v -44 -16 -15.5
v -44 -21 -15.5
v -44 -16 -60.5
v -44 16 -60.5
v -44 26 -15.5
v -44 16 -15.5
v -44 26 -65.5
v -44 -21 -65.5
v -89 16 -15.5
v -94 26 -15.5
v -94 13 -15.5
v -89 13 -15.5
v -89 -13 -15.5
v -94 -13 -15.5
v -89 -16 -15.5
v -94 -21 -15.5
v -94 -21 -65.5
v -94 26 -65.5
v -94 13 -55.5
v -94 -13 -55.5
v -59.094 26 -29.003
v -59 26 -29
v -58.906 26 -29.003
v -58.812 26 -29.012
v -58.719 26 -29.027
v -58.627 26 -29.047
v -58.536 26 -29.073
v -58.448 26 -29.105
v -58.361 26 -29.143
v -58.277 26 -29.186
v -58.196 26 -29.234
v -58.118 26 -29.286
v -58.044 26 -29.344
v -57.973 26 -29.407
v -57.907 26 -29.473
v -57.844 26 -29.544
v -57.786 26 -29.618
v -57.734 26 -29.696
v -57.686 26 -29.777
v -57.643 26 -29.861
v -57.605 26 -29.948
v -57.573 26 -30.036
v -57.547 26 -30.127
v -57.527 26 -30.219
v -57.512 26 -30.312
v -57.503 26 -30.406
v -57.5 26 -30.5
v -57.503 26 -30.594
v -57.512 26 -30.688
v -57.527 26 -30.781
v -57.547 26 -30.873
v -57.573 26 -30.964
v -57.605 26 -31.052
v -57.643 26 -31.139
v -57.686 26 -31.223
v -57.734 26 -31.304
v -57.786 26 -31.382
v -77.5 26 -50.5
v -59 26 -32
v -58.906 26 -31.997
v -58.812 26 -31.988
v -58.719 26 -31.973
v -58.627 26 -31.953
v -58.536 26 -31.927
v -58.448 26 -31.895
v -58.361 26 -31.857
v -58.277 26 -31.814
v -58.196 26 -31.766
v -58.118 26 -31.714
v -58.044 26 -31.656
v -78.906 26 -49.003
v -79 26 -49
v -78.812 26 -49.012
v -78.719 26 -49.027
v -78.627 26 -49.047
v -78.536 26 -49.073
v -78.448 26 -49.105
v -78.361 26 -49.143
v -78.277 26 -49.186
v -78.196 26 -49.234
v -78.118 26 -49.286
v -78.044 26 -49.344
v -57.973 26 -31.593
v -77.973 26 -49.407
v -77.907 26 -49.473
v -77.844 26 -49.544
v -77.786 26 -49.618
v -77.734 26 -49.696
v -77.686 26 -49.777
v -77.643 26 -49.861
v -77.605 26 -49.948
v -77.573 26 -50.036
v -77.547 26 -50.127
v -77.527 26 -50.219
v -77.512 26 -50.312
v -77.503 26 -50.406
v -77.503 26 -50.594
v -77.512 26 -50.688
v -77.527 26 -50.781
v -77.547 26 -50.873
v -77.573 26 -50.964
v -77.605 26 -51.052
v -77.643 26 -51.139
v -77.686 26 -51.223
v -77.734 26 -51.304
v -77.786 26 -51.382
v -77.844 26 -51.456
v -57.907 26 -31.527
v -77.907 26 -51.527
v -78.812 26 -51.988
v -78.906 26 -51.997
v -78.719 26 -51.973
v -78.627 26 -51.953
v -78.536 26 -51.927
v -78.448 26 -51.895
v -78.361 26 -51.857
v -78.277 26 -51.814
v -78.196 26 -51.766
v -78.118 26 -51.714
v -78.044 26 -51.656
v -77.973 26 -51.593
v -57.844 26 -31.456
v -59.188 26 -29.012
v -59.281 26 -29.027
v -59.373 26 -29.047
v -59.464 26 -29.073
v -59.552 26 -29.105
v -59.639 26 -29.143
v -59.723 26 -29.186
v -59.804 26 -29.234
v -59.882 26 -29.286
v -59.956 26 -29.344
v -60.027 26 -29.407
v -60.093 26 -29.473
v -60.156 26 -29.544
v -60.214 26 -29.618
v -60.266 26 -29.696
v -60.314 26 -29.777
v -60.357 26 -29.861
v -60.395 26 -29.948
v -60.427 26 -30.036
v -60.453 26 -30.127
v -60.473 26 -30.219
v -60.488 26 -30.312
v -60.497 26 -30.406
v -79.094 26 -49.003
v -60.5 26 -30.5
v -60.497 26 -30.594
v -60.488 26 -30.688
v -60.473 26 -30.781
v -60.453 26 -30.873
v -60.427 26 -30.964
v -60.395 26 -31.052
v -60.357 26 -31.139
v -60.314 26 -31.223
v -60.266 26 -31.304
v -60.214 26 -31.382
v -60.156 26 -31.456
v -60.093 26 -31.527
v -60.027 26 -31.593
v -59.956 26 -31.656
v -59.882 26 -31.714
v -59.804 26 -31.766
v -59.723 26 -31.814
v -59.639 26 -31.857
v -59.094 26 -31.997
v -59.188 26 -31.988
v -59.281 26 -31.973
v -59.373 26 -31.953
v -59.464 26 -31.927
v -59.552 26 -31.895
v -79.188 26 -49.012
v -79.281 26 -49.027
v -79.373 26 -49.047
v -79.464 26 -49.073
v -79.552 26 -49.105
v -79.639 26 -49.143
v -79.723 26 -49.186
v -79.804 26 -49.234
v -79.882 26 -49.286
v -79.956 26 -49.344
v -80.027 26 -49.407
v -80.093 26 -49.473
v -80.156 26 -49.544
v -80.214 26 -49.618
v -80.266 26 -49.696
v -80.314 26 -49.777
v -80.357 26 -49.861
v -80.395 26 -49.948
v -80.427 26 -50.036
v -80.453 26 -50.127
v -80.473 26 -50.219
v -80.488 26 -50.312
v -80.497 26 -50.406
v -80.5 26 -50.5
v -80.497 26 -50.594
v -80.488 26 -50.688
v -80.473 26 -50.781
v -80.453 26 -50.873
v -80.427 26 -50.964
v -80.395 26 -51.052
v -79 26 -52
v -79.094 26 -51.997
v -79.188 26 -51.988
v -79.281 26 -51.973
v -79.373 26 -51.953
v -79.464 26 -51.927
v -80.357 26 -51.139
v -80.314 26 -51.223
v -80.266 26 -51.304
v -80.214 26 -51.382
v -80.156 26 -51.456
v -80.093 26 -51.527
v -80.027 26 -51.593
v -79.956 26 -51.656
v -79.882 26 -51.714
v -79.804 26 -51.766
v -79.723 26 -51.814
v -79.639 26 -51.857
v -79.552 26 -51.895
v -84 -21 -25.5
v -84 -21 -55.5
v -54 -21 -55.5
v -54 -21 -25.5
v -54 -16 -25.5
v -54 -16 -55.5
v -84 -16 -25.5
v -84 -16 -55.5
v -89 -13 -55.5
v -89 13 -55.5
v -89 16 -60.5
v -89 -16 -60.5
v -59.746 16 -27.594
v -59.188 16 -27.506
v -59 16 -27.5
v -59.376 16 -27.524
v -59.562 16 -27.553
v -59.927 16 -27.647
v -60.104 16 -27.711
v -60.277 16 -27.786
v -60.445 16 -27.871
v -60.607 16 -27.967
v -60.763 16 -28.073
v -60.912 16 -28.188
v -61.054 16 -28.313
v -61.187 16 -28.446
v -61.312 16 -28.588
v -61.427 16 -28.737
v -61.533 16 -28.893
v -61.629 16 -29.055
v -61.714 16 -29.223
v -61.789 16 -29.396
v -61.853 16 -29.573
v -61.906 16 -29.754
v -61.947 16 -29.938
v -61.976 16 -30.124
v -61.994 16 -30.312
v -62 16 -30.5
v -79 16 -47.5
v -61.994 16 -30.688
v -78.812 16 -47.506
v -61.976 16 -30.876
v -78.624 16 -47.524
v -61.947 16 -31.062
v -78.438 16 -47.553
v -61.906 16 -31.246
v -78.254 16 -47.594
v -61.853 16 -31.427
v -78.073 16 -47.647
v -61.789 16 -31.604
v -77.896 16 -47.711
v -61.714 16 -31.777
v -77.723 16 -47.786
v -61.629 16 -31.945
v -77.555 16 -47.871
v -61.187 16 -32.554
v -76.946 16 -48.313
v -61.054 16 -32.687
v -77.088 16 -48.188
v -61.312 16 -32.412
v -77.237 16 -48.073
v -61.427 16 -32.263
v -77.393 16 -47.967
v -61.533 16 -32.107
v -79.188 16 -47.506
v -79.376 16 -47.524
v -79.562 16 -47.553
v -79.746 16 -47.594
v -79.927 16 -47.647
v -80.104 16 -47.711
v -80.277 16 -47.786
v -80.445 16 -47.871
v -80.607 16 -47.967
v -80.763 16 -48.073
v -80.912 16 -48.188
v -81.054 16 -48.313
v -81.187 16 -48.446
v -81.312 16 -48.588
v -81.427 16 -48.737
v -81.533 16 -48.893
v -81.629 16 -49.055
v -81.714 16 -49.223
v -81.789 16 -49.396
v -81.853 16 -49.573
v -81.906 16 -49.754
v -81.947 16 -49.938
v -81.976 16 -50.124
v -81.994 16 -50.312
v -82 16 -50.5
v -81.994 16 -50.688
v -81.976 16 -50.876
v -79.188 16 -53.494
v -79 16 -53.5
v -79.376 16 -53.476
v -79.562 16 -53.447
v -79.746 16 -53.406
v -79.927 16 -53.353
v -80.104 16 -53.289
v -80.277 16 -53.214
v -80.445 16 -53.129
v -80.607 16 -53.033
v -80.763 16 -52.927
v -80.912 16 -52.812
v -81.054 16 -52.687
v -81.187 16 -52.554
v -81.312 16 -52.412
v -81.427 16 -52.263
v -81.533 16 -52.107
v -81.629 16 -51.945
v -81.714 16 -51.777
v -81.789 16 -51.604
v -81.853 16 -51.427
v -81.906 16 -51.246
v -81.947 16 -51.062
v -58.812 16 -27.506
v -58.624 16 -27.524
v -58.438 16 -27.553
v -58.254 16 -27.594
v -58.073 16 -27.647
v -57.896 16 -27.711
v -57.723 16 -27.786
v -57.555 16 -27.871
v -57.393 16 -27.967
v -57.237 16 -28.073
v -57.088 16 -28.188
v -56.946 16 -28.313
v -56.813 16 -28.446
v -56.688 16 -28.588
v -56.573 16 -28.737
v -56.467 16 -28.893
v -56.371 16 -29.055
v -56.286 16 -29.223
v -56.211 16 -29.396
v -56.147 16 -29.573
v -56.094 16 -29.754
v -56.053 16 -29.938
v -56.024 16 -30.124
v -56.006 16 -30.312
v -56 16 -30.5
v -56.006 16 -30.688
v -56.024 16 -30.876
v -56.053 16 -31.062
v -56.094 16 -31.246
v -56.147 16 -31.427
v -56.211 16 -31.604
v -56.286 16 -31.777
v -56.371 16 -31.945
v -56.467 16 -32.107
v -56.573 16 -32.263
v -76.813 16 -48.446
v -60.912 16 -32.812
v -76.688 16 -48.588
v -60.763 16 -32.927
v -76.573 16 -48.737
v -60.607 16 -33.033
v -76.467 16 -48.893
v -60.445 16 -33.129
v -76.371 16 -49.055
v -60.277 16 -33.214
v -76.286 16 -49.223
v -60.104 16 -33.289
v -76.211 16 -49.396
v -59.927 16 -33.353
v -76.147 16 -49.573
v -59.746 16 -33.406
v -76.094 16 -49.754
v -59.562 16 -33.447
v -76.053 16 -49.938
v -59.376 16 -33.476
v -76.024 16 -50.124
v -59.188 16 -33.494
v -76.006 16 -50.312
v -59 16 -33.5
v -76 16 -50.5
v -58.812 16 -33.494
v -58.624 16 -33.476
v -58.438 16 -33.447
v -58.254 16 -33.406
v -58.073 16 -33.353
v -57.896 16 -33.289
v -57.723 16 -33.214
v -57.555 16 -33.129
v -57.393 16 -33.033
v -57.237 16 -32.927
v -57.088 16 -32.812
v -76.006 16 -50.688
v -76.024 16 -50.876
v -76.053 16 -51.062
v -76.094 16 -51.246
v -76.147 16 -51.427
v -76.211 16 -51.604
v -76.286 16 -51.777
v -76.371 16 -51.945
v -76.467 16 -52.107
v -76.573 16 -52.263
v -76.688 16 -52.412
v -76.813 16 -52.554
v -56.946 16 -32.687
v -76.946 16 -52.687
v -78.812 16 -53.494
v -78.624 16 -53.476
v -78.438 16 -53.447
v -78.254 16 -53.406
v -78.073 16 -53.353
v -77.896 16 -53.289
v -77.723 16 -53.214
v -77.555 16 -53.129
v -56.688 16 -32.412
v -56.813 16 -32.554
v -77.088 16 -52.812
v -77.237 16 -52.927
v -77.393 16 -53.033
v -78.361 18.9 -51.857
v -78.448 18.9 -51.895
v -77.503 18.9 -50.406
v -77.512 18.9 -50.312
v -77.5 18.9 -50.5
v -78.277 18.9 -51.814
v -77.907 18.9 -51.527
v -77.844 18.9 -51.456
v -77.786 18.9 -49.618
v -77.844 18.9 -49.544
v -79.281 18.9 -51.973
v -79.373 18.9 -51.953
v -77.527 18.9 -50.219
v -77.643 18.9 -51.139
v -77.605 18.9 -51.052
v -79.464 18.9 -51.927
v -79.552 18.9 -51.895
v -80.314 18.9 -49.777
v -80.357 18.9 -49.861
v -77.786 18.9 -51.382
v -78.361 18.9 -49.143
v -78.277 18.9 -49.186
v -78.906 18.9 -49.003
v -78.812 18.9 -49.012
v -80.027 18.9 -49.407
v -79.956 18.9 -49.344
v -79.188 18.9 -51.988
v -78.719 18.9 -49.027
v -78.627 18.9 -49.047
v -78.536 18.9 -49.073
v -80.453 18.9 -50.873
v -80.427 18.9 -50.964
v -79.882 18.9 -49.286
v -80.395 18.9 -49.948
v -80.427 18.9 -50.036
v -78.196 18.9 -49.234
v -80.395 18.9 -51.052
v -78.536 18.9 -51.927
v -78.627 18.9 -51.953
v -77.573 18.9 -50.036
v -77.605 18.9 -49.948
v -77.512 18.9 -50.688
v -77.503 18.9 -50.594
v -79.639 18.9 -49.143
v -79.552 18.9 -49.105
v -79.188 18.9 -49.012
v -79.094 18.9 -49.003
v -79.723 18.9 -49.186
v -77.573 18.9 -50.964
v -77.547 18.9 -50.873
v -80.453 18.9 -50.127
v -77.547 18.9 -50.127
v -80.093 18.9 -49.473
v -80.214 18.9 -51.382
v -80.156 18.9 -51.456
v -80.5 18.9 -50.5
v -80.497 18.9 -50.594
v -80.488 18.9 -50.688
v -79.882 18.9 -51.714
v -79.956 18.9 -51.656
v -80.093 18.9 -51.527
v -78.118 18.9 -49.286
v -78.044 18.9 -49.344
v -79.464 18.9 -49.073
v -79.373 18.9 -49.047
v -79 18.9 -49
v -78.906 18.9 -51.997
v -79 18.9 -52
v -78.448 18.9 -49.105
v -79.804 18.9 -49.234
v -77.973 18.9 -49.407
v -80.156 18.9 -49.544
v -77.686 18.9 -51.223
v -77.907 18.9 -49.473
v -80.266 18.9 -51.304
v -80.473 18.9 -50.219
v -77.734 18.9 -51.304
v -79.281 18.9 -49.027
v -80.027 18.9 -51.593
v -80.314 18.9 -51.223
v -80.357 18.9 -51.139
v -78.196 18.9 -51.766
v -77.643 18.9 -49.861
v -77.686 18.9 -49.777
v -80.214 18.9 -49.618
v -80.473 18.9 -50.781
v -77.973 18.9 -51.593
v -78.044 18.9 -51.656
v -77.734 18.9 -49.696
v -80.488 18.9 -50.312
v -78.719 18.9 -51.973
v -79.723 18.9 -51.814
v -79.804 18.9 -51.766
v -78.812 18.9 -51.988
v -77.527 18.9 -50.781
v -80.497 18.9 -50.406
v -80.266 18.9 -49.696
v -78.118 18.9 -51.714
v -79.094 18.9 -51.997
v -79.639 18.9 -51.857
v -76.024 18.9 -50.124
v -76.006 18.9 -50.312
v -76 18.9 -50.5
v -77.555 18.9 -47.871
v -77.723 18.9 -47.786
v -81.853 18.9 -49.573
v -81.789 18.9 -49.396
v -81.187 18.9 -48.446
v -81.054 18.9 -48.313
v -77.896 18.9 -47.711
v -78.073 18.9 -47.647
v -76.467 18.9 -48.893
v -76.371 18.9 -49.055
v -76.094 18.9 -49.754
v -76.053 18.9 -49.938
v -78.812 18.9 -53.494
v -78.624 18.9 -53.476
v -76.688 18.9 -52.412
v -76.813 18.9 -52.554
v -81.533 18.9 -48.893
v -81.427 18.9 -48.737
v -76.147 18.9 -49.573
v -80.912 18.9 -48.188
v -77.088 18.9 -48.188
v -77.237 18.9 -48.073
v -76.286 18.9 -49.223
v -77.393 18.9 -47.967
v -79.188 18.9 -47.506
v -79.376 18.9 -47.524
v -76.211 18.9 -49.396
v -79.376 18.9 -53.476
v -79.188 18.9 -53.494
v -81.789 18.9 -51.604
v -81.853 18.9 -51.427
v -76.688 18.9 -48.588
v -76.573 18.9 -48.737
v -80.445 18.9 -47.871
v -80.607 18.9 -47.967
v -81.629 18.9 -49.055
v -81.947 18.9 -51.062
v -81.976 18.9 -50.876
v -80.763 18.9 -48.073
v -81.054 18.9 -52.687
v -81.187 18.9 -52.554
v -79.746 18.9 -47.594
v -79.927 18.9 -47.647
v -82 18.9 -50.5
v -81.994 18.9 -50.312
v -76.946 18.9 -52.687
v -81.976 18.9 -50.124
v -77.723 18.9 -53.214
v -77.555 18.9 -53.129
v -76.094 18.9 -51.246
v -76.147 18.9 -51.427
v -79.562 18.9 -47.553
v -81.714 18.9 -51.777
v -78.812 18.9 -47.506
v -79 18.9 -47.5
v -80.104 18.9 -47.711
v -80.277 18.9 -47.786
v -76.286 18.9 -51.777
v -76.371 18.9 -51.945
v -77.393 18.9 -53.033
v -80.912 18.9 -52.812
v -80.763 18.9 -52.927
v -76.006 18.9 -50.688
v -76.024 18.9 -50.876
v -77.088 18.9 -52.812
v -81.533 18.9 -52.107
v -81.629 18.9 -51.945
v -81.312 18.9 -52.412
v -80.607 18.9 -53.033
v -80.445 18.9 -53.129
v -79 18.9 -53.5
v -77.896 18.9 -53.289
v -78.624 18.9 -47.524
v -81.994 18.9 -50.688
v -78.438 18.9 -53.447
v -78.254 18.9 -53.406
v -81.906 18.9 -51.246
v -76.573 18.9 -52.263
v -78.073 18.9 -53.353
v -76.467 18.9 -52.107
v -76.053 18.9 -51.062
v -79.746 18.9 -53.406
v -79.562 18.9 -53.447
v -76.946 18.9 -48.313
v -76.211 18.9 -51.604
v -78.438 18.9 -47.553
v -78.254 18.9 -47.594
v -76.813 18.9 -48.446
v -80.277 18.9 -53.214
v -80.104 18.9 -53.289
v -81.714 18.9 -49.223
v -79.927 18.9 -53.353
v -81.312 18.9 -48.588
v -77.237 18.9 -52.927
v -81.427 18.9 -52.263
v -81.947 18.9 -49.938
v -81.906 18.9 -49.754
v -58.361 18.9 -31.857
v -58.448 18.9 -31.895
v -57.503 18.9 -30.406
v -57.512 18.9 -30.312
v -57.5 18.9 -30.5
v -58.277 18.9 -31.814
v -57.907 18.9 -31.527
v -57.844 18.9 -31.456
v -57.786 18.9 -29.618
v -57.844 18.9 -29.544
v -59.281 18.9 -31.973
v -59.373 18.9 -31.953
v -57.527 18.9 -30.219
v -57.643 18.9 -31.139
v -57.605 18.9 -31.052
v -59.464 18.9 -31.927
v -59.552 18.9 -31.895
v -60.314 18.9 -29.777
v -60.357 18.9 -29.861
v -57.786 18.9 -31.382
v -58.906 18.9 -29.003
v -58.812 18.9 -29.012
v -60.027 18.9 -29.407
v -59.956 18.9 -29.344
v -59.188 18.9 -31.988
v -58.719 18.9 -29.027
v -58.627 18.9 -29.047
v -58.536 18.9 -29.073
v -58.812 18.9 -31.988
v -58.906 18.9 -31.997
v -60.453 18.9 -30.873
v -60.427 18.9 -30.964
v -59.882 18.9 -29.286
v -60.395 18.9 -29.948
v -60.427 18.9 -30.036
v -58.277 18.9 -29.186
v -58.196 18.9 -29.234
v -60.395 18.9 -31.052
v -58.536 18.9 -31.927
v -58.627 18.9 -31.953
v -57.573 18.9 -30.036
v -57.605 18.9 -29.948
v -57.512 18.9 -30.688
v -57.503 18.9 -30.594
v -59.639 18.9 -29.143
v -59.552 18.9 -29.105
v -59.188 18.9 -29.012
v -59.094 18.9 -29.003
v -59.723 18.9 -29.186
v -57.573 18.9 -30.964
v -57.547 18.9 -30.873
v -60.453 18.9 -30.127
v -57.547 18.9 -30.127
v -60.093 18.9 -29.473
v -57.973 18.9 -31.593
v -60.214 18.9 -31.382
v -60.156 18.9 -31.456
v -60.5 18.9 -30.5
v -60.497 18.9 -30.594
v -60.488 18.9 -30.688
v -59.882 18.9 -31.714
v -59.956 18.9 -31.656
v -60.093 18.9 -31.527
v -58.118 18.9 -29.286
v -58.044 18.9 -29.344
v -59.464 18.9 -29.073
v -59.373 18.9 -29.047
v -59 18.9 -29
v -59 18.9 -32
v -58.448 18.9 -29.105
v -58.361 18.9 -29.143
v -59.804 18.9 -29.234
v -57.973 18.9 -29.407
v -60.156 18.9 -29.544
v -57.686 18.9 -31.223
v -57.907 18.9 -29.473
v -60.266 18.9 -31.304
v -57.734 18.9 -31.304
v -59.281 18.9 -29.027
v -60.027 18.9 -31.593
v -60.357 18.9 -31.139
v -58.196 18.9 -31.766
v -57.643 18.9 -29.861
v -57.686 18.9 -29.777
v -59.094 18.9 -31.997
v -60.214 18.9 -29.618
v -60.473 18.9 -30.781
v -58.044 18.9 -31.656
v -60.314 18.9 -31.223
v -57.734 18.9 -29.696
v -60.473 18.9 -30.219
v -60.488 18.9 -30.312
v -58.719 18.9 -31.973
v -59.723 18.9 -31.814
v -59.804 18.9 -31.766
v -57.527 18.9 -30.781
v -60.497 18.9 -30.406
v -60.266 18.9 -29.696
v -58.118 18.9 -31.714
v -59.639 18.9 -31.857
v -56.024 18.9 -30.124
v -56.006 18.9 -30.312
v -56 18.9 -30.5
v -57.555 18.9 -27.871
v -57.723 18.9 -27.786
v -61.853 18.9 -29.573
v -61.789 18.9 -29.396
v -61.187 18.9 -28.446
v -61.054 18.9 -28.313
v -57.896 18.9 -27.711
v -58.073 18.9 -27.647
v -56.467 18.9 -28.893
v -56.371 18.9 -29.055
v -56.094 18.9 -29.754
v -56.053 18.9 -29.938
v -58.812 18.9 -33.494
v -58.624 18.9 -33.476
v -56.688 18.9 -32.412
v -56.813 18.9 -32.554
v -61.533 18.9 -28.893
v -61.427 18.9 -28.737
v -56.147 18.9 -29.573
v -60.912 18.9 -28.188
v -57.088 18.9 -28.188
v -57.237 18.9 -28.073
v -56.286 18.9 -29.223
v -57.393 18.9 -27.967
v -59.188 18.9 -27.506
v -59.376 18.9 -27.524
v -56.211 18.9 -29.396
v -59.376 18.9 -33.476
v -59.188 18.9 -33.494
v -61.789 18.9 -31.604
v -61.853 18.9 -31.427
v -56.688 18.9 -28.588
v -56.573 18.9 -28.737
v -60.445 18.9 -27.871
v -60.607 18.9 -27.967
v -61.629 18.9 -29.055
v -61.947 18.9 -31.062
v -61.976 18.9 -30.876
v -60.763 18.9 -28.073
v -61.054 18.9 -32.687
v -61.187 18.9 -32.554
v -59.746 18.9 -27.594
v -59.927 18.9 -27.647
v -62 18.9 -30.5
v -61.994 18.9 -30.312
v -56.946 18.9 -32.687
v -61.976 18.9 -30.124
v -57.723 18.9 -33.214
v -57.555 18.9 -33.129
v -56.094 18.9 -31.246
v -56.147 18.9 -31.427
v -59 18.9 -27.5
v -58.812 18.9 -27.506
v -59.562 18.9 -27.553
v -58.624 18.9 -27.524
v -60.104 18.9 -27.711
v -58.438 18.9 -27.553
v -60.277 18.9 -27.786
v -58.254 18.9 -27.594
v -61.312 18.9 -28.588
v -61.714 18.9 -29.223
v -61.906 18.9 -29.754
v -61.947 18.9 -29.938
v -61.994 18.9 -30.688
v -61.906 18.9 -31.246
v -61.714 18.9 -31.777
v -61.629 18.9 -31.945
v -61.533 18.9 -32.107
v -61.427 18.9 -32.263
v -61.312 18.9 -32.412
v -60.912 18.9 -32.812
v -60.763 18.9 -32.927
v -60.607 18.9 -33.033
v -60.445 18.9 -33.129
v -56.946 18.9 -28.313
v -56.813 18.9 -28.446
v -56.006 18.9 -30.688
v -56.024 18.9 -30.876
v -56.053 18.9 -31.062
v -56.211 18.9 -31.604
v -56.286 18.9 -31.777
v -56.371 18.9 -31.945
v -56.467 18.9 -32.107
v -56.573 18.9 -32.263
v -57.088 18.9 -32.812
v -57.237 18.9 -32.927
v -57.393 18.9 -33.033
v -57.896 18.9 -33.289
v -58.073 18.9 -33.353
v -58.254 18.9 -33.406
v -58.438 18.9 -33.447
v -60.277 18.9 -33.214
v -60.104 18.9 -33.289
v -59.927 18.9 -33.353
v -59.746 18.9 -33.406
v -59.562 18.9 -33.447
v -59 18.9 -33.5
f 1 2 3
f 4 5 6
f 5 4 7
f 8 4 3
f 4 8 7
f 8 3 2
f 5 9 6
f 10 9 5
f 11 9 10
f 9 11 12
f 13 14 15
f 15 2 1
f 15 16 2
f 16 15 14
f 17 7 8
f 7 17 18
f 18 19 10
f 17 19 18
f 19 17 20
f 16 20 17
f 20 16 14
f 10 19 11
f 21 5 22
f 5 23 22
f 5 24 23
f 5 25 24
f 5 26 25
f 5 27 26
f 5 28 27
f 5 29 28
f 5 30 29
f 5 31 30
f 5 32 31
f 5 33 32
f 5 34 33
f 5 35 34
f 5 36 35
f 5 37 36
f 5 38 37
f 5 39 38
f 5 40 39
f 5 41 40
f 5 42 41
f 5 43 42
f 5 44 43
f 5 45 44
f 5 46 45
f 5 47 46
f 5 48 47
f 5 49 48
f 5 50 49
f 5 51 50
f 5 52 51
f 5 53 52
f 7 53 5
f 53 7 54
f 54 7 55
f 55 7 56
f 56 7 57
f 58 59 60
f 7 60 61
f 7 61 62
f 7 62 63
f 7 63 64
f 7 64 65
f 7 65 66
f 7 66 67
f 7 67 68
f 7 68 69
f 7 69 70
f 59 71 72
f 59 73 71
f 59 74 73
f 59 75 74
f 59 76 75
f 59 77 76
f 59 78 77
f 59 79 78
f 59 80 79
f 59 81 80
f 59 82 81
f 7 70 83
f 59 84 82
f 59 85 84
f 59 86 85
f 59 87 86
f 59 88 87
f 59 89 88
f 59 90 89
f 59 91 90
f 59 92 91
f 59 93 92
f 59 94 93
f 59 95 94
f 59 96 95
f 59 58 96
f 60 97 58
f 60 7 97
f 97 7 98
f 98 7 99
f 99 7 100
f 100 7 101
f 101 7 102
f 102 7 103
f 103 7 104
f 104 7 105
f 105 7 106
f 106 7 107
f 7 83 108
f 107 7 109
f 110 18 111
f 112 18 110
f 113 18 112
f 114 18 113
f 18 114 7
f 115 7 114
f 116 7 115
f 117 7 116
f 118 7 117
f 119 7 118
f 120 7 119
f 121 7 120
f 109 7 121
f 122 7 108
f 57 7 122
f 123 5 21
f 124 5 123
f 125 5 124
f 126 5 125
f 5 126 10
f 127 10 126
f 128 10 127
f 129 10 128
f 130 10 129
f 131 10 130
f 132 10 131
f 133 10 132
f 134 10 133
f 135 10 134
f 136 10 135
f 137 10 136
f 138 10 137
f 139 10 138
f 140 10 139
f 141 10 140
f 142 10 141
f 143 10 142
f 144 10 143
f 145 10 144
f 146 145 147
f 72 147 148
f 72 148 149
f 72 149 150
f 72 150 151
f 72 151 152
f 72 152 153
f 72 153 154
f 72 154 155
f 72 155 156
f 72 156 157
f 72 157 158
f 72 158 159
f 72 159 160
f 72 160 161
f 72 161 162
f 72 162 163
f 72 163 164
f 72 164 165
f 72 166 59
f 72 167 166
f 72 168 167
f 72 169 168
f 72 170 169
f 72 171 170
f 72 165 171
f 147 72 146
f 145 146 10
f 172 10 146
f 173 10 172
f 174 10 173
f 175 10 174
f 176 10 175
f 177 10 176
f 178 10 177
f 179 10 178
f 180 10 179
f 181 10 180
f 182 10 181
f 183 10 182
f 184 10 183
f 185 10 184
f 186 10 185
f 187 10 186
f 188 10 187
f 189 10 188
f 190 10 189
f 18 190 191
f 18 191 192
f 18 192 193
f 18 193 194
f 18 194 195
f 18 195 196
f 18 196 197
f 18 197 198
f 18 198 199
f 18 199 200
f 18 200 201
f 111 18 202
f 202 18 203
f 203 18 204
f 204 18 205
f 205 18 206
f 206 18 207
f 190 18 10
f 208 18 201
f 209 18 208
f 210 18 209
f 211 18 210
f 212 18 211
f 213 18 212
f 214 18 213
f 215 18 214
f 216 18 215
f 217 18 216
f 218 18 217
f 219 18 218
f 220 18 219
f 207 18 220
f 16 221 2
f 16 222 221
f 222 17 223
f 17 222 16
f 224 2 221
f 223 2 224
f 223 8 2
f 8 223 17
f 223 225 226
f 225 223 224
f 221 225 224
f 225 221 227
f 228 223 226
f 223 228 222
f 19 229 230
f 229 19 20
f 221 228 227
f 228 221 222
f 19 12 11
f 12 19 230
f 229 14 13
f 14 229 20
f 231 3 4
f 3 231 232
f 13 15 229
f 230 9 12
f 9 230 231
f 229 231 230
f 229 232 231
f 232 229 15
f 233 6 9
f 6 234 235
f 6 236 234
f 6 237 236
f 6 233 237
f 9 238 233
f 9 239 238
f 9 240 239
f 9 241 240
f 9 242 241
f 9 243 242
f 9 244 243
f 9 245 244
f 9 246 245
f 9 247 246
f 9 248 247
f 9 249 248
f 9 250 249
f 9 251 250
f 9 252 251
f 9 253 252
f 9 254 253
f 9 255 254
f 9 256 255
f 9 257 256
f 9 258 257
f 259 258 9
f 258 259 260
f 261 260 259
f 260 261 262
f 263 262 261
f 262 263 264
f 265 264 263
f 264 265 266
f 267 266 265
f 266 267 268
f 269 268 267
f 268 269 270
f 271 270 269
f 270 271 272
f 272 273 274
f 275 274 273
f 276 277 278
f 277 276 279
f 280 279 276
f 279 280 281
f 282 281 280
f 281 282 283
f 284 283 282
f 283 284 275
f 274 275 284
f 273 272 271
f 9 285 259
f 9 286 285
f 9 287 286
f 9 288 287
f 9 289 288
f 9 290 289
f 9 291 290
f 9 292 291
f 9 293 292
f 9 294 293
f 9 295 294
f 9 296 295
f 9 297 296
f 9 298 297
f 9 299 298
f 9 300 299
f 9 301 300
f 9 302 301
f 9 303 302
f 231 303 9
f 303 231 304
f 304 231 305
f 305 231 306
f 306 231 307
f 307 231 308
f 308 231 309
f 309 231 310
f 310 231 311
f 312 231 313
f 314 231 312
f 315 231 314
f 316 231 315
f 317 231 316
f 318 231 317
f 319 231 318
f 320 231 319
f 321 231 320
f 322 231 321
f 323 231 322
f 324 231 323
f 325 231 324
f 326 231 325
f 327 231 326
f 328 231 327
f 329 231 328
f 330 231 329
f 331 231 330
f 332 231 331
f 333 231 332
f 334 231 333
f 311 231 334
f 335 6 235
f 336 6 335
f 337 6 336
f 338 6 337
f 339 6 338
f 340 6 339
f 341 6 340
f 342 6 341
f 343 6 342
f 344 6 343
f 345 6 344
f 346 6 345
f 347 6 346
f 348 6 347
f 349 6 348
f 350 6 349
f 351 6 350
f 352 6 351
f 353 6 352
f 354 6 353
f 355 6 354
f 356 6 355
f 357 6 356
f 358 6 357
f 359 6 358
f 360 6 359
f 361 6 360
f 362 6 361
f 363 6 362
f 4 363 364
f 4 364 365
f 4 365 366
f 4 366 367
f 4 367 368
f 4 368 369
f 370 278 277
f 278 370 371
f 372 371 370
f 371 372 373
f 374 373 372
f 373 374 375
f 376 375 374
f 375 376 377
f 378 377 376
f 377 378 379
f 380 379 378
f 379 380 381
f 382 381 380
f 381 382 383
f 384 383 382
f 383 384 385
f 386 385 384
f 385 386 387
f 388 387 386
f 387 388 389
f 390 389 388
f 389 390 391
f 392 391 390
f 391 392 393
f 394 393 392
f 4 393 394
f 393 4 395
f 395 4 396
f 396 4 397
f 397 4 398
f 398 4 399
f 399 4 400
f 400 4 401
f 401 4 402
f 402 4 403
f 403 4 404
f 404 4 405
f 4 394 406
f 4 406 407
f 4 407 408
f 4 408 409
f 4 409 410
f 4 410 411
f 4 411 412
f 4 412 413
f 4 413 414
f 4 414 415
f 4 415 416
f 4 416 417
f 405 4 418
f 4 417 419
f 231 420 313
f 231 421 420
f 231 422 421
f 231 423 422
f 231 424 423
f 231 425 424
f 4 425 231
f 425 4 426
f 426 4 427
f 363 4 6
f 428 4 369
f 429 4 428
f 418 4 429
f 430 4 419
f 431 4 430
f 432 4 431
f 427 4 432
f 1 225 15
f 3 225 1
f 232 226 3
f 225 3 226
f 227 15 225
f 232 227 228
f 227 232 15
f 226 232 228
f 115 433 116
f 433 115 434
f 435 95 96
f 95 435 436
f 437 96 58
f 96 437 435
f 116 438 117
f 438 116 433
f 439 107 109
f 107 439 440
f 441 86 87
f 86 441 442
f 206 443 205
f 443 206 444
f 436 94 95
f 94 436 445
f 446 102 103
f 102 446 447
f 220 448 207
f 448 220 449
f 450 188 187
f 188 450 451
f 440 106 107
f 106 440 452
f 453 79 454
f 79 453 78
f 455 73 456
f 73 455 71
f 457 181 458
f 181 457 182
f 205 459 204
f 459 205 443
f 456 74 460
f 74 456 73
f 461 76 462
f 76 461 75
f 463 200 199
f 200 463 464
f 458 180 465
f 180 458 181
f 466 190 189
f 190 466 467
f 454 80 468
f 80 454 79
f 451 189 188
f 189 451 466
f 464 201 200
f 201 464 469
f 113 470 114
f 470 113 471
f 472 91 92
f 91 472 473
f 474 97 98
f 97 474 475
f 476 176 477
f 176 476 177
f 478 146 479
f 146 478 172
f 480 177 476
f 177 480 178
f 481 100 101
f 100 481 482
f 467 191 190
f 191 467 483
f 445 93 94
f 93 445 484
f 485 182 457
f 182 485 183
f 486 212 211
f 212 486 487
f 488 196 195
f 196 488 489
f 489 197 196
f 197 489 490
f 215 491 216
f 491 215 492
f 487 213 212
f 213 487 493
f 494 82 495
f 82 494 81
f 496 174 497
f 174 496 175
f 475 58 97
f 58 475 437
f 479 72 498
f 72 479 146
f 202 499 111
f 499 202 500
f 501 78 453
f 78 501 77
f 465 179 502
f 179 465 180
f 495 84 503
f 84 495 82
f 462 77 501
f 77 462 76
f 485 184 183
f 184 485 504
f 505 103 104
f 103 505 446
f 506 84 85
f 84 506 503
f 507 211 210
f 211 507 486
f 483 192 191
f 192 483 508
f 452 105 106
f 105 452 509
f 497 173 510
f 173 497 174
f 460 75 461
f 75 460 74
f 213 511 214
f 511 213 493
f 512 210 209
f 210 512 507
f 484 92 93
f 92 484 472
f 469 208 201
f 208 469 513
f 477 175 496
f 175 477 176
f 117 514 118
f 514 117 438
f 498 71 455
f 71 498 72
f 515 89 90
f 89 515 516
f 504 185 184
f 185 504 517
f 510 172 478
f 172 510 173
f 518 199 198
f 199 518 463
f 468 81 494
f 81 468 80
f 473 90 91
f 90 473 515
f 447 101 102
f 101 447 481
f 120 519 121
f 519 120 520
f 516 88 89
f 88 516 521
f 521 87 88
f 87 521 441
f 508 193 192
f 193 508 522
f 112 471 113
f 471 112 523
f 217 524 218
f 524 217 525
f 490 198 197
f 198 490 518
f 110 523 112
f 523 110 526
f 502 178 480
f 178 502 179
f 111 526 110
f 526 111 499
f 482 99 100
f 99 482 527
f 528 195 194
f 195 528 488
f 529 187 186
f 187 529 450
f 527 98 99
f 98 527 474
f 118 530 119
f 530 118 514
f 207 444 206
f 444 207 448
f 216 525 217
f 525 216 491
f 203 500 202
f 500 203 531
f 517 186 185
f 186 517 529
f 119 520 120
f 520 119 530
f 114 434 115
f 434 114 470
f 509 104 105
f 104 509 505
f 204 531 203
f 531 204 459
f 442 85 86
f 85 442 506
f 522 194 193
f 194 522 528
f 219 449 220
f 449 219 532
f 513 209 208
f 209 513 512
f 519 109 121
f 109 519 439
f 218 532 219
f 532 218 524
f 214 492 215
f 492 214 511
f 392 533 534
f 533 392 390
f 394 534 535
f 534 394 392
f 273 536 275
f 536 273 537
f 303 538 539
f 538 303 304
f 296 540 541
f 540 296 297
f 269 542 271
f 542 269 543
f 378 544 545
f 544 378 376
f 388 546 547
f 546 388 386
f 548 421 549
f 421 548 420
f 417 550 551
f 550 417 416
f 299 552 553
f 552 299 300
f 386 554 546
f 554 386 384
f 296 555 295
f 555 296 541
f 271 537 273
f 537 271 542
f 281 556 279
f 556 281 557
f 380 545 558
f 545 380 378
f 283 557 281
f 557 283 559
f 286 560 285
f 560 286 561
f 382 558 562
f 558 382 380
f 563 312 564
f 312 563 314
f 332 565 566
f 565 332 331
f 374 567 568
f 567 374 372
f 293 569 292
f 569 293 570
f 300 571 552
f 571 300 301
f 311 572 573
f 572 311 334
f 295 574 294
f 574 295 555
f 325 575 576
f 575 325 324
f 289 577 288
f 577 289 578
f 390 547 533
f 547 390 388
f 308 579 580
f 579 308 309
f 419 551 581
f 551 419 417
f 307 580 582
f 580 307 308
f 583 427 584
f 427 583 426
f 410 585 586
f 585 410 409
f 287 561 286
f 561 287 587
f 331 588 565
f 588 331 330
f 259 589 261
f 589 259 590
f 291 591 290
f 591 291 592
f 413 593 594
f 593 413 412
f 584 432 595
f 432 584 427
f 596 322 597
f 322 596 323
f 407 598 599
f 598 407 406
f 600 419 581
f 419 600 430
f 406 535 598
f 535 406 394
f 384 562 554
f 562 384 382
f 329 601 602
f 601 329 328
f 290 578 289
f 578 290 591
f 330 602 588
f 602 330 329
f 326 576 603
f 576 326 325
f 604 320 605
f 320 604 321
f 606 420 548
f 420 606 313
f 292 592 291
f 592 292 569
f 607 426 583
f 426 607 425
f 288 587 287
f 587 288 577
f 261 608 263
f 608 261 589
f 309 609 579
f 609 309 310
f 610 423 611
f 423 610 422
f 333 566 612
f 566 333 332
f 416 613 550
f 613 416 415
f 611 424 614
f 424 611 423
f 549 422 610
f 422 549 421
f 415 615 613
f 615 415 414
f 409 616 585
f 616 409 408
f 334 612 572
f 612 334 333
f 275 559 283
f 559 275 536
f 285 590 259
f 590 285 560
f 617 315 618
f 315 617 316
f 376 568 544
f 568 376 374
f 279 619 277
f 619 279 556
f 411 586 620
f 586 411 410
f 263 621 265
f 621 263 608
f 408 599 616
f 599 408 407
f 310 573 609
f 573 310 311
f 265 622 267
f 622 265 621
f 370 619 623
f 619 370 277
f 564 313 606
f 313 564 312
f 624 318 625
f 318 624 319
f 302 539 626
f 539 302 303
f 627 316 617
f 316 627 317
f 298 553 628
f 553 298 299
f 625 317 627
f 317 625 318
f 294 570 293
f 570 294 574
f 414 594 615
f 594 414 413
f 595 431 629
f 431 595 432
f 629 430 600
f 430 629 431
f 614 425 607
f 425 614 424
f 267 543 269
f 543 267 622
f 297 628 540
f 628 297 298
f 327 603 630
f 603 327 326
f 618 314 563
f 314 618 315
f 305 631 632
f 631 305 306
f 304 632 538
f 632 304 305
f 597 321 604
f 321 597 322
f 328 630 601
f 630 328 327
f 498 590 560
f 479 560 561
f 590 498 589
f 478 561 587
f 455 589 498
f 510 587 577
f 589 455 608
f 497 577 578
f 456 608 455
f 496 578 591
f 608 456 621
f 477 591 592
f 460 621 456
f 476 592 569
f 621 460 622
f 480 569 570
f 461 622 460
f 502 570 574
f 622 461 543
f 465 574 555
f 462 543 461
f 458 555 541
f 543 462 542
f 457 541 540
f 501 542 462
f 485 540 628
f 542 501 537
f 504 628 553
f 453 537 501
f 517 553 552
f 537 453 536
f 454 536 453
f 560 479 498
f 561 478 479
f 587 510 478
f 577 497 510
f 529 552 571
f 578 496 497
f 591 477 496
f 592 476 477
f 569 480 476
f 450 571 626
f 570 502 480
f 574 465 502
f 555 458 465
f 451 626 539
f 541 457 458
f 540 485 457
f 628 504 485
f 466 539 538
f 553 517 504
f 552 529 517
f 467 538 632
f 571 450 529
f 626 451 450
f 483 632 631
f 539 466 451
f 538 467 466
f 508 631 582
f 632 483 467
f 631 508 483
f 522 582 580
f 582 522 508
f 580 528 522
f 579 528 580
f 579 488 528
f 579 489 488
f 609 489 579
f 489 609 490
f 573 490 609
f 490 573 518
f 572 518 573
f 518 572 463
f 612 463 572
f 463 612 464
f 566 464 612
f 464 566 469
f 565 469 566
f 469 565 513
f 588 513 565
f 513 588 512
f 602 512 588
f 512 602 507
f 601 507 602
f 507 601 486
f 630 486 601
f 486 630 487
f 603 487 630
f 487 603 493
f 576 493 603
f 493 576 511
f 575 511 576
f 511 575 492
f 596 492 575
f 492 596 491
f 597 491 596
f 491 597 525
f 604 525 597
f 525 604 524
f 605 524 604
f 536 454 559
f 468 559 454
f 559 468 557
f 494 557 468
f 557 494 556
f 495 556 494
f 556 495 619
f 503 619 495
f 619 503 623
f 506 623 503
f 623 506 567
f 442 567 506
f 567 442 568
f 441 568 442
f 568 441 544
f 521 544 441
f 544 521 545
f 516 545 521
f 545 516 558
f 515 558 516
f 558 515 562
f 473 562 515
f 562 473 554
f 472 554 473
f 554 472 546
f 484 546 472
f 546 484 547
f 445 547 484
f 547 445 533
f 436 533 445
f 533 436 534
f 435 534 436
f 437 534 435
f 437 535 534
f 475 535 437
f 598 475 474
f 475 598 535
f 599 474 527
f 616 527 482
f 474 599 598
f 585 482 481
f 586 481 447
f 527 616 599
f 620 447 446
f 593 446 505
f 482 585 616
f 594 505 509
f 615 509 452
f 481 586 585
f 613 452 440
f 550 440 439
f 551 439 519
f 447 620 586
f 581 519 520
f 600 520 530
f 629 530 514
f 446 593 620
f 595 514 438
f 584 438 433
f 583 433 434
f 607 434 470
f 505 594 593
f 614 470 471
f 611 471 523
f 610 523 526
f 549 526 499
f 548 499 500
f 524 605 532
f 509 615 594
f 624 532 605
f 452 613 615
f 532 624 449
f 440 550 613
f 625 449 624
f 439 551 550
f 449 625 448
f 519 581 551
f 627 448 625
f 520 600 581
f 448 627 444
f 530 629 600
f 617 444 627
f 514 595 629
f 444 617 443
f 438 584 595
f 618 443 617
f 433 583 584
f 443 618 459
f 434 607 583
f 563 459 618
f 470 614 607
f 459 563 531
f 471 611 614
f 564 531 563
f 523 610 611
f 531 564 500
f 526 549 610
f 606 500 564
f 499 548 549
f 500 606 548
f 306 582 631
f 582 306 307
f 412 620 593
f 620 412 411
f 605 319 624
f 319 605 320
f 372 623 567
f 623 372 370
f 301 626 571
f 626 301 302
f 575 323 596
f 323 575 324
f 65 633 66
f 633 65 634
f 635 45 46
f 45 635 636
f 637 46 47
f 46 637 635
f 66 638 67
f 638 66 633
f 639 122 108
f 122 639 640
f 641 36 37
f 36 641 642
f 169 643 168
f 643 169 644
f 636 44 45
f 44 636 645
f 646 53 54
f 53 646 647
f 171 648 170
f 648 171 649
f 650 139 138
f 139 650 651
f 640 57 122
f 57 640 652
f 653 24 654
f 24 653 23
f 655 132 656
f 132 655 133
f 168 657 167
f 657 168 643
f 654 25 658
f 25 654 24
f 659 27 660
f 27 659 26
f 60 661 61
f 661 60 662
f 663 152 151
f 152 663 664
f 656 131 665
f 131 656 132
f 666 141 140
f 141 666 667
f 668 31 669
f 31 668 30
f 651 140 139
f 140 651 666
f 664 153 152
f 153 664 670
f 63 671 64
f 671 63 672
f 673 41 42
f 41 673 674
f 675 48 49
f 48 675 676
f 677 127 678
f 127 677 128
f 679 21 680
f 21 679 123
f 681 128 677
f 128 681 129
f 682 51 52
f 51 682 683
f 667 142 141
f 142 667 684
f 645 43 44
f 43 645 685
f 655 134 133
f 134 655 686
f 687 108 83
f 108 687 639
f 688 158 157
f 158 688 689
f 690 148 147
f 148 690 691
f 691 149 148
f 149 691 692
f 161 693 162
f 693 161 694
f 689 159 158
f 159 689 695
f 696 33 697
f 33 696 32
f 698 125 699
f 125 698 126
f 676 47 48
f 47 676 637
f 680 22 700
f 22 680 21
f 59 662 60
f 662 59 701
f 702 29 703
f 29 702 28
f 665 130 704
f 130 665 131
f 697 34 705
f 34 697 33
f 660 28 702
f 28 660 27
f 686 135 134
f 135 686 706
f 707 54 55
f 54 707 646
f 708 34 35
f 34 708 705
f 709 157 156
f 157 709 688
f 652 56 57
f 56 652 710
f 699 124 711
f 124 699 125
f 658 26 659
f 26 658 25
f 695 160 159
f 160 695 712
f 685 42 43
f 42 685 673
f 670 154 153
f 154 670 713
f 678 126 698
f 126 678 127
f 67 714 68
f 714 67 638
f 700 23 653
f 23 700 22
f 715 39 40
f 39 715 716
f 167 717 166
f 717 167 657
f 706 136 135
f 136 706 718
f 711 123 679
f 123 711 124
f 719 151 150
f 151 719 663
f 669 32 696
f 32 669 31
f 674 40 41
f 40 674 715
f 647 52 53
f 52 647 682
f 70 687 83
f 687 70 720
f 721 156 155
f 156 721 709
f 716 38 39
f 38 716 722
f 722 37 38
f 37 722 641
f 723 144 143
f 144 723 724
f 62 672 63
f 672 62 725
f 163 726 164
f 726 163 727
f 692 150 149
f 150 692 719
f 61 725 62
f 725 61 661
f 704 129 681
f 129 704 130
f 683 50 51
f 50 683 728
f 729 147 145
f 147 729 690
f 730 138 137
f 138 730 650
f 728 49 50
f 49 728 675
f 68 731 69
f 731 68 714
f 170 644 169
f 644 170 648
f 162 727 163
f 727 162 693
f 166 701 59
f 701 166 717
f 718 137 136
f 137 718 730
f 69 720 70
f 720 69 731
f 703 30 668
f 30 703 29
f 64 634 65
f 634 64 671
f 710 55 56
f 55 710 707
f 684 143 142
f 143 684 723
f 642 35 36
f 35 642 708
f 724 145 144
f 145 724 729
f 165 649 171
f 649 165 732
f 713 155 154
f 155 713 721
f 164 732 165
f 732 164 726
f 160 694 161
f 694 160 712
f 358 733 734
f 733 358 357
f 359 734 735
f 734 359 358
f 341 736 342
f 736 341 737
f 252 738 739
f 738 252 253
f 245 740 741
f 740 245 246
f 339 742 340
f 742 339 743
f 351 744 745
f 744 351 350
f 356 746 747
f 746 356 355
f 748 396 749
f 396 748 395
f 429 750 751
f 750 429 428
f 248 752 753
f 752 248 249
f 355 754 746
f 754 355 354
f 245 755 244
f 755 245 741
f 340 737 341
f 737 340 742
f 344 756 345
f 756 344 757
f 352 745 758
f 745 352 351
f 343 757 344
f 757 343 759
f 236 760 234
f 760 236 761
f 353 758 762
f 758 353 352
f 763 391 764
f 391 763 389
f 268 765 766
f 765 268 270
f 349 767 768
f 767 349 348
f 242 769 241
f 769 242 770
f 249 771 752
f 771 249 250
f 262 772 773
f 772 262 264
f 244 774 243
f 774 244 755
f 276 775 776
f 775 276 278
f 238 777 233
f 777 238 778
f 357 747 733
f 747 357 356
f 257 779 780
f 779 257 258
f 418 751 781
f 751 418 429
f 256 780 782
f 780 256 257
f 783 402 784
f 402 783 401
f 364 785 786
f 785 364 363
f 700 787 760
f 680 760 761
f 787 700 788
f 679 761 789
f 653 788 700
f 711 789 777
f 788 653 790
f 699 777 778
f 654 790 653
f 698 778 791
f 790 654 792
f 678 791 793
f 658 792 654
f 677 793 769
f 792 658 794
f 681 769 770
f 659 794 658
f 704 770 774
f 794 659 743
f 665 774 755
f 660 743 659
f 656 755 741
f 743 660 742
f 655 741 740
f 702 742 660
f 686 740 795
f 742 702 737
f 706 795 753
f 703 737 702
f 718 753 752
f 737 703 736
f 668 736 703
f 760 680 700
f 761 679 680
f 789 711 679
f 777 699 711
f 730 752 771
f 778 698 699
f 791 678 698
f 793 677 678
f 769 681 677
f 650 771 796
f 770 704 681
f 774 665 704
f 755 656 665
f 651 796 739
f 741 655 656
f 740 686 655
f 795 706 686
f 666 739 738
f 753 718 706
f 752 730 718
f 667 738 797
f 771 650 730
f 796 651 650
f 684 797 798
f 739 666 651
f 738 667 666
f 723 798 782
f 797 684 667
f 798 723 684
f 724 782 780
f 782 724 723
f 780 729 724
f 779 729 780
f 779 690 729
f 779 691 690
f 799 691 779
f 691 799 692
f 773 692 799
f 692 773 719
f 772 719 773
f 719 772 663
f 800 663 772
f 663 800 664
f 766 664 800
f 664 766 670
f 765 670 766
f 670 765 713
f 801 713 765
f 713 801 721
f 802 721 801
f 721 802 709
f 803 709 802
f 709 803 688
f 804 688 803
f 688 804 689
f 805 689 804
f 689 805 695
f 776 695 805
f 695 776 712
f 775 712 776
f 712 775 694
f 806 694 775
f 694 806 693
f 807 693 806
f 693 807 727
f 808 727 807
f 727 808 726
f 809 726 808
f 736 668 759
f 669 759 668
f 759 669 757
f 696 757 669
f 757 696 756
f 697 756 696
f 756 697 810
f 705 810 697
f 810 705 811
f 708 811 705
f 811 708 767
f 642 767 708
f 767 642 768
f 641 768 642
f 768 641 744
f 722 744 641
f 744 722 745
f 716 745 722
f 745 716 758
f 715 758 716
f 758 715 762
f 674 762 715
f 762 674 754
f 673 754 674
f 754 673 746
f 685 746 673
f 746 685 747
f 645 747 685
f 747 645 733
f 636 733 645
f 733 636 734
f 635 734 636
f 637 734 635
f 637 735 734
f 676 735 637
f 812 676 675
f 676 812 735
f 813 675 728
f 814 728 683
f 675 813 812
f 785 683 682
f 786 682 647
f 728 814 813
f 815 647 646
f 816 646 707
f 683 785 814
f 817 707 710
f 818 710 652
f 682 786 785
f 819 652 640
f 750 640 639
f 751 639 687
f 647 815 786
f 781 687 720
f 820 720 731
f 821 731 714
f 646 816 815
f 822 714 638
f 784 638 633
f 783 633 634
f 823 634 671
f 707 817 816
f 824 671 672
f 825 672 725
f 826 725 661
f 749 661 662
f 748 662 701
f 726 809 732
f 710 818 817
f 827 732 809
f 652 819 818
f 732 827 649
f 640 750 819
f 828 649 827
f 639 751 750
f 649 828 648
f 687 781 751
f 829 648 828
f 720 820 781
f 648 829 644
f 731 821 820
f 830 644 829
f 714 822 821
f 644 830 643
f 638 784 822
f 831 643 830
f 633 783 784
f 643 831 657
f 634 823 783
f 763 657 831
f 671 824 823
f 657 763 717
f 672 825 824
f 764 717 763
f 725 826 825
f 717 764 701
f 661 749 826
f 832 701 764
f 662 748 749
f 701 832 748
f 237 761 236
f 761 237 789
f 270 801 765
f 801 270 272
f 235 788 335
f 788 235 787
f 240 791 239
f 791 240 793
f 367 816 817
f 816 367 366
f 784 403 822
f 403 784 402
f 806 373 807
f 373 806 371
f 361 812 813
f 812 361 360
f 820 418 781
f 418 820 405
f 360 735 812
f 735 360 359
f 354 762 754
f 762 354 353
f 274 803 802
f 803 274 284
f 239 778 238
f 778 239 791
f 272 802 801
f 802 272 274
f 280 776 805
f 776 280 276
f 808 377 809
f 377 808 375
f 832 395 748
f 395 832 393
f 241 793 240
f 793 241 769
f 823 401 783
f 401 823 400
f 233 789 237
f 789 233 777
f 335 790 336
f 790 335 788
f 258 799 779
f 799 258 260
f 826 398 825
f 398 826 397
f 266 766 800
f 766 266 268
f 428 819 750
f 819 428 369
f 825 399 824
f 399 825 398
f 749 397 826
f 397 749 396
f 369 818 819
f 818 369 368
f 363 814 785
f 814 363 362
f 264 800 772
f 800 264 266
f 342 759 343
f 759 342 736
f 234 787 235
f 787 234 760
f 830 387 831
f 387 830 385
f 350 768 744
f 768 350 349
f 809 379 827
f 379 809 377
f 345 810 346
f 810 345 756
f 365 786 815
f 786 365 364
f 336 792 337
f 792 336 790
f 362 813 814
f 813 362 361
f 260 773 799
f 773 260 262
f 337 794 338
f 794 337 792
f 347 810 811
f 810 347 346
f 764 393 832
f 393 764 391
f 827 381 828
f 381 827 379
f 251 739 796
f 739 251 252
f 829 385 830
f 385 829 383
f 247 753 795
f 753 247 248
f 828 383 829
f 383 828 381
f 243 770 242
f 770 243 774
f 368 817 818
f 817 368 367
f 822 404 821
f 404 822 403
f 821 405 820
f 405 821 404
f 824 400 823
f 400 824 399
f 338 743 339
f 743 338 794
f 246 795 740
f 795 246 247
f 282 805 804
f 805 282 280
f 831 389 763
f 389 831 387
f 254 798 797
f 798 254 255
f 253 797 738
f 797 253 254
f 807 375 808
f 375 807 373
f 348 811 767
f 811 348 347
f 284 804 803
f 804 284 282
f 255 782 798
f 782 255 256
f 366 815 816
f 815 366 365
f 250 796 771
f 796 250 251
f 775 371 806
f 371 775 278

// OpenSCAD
// file: shanqiu-ups-fx-5-12-pro-ac.scad
// Wall mount corner for Shanqiu UPS FX 5-12Pro-AC
// https://hgdups.com/product-13896-13942-36287.html

ups_depth = 32;
ups_height = 178;
ups_width = 121;

ups_depth_h = ups_depth / 2;
ups_height_h = ups_height / 2;
ups_width_h = ups_width / 2;

module shanqiu_ups(show, color="blue") {
	if (show) {
		color(color) cube([ups_height, ups_depth, ups_width], center=true);
	}
}
// main file
// Wall mount corner for Shanqiu UPS FX 5-12Pro-AC
// https://hgdups.com/product-13896-13942-36287.html

include <shanqiu-ups-fx-5-12-pro-ac.scad>

shanqiu_ups($preview);

box_color = "green";
box_cont = 10;
box_depth_pad = 0;

ups_border_sep = 6;
ups_wall_sep = 10;
ups_wall_sep_add = ups_wall_sep - box_cont / 2;

box_depth = ups_depth + box_depth_pad + box_cont;
box_height = 50;
box_width = 50;

box_cont_h = box_cont / 2;
box_depth_h = box_depth / 2;
box_height_h = box_height / 2;
box_width_h = box_width / 2;

difference() {
    translate([-(ups_height_h - box_height_h + box_cont_h), ups_wall_sep_add / 2, -(ups_width_h - box_width_h + box_cont_h)]) union() {
        color(box_color) difference() {
            cube([box_width, box_depth + ups_wall_sep_add, box_height], center=true);
            translate([0, -ups_wall_sep_add * 2 - box_cont, 0]) cube([box_width - box_cont * 2, box_depth + box_cont, box_height - box_cont * 2], center=true);
            translate([-ups_wall_sep, -ups_wall_sep_add / 2, box_cont]) cube([box_width, box_depth - ups_border_sep - box_cont, box_height], center=true);
        }
    }

    shanqiu_ups(true, box_color);

    translate([-(ups_height_h - box_cont), ups_depth_h + ups_wall_sep_add, -ups_width_h + box_cont]) rotate([90, 0, 0]) cylinder(ups_wall_sep + 1, d=3, center=true, $fn=100);
    translate([-(ups_height_h - box_cont), ups_depth_h + 1.4, -ups_width_h + box_cont]) rotate([90, 0, 0]) cylinder(3, d=6, center=true, $fn=100);

    translate([-(ups_height_h - box_height + box_cont * 2), ups_depth_h + ups_wall_sep_add, -ups_width_h + box_width - box_cont * 2]) rotate([90, 0, 0]) cylinder(ups_wall_sep + 1, d=3, center=true, $fn=100);
    translate([-(ups_height_h - box_height + box_cont * 2), ups_depth_h + 1.4, -ups_width_h + box_width - box_cont * 2]) rotate([90, 0, 0]) cylinder(3, d=6, center=true, $fn=100);
}
